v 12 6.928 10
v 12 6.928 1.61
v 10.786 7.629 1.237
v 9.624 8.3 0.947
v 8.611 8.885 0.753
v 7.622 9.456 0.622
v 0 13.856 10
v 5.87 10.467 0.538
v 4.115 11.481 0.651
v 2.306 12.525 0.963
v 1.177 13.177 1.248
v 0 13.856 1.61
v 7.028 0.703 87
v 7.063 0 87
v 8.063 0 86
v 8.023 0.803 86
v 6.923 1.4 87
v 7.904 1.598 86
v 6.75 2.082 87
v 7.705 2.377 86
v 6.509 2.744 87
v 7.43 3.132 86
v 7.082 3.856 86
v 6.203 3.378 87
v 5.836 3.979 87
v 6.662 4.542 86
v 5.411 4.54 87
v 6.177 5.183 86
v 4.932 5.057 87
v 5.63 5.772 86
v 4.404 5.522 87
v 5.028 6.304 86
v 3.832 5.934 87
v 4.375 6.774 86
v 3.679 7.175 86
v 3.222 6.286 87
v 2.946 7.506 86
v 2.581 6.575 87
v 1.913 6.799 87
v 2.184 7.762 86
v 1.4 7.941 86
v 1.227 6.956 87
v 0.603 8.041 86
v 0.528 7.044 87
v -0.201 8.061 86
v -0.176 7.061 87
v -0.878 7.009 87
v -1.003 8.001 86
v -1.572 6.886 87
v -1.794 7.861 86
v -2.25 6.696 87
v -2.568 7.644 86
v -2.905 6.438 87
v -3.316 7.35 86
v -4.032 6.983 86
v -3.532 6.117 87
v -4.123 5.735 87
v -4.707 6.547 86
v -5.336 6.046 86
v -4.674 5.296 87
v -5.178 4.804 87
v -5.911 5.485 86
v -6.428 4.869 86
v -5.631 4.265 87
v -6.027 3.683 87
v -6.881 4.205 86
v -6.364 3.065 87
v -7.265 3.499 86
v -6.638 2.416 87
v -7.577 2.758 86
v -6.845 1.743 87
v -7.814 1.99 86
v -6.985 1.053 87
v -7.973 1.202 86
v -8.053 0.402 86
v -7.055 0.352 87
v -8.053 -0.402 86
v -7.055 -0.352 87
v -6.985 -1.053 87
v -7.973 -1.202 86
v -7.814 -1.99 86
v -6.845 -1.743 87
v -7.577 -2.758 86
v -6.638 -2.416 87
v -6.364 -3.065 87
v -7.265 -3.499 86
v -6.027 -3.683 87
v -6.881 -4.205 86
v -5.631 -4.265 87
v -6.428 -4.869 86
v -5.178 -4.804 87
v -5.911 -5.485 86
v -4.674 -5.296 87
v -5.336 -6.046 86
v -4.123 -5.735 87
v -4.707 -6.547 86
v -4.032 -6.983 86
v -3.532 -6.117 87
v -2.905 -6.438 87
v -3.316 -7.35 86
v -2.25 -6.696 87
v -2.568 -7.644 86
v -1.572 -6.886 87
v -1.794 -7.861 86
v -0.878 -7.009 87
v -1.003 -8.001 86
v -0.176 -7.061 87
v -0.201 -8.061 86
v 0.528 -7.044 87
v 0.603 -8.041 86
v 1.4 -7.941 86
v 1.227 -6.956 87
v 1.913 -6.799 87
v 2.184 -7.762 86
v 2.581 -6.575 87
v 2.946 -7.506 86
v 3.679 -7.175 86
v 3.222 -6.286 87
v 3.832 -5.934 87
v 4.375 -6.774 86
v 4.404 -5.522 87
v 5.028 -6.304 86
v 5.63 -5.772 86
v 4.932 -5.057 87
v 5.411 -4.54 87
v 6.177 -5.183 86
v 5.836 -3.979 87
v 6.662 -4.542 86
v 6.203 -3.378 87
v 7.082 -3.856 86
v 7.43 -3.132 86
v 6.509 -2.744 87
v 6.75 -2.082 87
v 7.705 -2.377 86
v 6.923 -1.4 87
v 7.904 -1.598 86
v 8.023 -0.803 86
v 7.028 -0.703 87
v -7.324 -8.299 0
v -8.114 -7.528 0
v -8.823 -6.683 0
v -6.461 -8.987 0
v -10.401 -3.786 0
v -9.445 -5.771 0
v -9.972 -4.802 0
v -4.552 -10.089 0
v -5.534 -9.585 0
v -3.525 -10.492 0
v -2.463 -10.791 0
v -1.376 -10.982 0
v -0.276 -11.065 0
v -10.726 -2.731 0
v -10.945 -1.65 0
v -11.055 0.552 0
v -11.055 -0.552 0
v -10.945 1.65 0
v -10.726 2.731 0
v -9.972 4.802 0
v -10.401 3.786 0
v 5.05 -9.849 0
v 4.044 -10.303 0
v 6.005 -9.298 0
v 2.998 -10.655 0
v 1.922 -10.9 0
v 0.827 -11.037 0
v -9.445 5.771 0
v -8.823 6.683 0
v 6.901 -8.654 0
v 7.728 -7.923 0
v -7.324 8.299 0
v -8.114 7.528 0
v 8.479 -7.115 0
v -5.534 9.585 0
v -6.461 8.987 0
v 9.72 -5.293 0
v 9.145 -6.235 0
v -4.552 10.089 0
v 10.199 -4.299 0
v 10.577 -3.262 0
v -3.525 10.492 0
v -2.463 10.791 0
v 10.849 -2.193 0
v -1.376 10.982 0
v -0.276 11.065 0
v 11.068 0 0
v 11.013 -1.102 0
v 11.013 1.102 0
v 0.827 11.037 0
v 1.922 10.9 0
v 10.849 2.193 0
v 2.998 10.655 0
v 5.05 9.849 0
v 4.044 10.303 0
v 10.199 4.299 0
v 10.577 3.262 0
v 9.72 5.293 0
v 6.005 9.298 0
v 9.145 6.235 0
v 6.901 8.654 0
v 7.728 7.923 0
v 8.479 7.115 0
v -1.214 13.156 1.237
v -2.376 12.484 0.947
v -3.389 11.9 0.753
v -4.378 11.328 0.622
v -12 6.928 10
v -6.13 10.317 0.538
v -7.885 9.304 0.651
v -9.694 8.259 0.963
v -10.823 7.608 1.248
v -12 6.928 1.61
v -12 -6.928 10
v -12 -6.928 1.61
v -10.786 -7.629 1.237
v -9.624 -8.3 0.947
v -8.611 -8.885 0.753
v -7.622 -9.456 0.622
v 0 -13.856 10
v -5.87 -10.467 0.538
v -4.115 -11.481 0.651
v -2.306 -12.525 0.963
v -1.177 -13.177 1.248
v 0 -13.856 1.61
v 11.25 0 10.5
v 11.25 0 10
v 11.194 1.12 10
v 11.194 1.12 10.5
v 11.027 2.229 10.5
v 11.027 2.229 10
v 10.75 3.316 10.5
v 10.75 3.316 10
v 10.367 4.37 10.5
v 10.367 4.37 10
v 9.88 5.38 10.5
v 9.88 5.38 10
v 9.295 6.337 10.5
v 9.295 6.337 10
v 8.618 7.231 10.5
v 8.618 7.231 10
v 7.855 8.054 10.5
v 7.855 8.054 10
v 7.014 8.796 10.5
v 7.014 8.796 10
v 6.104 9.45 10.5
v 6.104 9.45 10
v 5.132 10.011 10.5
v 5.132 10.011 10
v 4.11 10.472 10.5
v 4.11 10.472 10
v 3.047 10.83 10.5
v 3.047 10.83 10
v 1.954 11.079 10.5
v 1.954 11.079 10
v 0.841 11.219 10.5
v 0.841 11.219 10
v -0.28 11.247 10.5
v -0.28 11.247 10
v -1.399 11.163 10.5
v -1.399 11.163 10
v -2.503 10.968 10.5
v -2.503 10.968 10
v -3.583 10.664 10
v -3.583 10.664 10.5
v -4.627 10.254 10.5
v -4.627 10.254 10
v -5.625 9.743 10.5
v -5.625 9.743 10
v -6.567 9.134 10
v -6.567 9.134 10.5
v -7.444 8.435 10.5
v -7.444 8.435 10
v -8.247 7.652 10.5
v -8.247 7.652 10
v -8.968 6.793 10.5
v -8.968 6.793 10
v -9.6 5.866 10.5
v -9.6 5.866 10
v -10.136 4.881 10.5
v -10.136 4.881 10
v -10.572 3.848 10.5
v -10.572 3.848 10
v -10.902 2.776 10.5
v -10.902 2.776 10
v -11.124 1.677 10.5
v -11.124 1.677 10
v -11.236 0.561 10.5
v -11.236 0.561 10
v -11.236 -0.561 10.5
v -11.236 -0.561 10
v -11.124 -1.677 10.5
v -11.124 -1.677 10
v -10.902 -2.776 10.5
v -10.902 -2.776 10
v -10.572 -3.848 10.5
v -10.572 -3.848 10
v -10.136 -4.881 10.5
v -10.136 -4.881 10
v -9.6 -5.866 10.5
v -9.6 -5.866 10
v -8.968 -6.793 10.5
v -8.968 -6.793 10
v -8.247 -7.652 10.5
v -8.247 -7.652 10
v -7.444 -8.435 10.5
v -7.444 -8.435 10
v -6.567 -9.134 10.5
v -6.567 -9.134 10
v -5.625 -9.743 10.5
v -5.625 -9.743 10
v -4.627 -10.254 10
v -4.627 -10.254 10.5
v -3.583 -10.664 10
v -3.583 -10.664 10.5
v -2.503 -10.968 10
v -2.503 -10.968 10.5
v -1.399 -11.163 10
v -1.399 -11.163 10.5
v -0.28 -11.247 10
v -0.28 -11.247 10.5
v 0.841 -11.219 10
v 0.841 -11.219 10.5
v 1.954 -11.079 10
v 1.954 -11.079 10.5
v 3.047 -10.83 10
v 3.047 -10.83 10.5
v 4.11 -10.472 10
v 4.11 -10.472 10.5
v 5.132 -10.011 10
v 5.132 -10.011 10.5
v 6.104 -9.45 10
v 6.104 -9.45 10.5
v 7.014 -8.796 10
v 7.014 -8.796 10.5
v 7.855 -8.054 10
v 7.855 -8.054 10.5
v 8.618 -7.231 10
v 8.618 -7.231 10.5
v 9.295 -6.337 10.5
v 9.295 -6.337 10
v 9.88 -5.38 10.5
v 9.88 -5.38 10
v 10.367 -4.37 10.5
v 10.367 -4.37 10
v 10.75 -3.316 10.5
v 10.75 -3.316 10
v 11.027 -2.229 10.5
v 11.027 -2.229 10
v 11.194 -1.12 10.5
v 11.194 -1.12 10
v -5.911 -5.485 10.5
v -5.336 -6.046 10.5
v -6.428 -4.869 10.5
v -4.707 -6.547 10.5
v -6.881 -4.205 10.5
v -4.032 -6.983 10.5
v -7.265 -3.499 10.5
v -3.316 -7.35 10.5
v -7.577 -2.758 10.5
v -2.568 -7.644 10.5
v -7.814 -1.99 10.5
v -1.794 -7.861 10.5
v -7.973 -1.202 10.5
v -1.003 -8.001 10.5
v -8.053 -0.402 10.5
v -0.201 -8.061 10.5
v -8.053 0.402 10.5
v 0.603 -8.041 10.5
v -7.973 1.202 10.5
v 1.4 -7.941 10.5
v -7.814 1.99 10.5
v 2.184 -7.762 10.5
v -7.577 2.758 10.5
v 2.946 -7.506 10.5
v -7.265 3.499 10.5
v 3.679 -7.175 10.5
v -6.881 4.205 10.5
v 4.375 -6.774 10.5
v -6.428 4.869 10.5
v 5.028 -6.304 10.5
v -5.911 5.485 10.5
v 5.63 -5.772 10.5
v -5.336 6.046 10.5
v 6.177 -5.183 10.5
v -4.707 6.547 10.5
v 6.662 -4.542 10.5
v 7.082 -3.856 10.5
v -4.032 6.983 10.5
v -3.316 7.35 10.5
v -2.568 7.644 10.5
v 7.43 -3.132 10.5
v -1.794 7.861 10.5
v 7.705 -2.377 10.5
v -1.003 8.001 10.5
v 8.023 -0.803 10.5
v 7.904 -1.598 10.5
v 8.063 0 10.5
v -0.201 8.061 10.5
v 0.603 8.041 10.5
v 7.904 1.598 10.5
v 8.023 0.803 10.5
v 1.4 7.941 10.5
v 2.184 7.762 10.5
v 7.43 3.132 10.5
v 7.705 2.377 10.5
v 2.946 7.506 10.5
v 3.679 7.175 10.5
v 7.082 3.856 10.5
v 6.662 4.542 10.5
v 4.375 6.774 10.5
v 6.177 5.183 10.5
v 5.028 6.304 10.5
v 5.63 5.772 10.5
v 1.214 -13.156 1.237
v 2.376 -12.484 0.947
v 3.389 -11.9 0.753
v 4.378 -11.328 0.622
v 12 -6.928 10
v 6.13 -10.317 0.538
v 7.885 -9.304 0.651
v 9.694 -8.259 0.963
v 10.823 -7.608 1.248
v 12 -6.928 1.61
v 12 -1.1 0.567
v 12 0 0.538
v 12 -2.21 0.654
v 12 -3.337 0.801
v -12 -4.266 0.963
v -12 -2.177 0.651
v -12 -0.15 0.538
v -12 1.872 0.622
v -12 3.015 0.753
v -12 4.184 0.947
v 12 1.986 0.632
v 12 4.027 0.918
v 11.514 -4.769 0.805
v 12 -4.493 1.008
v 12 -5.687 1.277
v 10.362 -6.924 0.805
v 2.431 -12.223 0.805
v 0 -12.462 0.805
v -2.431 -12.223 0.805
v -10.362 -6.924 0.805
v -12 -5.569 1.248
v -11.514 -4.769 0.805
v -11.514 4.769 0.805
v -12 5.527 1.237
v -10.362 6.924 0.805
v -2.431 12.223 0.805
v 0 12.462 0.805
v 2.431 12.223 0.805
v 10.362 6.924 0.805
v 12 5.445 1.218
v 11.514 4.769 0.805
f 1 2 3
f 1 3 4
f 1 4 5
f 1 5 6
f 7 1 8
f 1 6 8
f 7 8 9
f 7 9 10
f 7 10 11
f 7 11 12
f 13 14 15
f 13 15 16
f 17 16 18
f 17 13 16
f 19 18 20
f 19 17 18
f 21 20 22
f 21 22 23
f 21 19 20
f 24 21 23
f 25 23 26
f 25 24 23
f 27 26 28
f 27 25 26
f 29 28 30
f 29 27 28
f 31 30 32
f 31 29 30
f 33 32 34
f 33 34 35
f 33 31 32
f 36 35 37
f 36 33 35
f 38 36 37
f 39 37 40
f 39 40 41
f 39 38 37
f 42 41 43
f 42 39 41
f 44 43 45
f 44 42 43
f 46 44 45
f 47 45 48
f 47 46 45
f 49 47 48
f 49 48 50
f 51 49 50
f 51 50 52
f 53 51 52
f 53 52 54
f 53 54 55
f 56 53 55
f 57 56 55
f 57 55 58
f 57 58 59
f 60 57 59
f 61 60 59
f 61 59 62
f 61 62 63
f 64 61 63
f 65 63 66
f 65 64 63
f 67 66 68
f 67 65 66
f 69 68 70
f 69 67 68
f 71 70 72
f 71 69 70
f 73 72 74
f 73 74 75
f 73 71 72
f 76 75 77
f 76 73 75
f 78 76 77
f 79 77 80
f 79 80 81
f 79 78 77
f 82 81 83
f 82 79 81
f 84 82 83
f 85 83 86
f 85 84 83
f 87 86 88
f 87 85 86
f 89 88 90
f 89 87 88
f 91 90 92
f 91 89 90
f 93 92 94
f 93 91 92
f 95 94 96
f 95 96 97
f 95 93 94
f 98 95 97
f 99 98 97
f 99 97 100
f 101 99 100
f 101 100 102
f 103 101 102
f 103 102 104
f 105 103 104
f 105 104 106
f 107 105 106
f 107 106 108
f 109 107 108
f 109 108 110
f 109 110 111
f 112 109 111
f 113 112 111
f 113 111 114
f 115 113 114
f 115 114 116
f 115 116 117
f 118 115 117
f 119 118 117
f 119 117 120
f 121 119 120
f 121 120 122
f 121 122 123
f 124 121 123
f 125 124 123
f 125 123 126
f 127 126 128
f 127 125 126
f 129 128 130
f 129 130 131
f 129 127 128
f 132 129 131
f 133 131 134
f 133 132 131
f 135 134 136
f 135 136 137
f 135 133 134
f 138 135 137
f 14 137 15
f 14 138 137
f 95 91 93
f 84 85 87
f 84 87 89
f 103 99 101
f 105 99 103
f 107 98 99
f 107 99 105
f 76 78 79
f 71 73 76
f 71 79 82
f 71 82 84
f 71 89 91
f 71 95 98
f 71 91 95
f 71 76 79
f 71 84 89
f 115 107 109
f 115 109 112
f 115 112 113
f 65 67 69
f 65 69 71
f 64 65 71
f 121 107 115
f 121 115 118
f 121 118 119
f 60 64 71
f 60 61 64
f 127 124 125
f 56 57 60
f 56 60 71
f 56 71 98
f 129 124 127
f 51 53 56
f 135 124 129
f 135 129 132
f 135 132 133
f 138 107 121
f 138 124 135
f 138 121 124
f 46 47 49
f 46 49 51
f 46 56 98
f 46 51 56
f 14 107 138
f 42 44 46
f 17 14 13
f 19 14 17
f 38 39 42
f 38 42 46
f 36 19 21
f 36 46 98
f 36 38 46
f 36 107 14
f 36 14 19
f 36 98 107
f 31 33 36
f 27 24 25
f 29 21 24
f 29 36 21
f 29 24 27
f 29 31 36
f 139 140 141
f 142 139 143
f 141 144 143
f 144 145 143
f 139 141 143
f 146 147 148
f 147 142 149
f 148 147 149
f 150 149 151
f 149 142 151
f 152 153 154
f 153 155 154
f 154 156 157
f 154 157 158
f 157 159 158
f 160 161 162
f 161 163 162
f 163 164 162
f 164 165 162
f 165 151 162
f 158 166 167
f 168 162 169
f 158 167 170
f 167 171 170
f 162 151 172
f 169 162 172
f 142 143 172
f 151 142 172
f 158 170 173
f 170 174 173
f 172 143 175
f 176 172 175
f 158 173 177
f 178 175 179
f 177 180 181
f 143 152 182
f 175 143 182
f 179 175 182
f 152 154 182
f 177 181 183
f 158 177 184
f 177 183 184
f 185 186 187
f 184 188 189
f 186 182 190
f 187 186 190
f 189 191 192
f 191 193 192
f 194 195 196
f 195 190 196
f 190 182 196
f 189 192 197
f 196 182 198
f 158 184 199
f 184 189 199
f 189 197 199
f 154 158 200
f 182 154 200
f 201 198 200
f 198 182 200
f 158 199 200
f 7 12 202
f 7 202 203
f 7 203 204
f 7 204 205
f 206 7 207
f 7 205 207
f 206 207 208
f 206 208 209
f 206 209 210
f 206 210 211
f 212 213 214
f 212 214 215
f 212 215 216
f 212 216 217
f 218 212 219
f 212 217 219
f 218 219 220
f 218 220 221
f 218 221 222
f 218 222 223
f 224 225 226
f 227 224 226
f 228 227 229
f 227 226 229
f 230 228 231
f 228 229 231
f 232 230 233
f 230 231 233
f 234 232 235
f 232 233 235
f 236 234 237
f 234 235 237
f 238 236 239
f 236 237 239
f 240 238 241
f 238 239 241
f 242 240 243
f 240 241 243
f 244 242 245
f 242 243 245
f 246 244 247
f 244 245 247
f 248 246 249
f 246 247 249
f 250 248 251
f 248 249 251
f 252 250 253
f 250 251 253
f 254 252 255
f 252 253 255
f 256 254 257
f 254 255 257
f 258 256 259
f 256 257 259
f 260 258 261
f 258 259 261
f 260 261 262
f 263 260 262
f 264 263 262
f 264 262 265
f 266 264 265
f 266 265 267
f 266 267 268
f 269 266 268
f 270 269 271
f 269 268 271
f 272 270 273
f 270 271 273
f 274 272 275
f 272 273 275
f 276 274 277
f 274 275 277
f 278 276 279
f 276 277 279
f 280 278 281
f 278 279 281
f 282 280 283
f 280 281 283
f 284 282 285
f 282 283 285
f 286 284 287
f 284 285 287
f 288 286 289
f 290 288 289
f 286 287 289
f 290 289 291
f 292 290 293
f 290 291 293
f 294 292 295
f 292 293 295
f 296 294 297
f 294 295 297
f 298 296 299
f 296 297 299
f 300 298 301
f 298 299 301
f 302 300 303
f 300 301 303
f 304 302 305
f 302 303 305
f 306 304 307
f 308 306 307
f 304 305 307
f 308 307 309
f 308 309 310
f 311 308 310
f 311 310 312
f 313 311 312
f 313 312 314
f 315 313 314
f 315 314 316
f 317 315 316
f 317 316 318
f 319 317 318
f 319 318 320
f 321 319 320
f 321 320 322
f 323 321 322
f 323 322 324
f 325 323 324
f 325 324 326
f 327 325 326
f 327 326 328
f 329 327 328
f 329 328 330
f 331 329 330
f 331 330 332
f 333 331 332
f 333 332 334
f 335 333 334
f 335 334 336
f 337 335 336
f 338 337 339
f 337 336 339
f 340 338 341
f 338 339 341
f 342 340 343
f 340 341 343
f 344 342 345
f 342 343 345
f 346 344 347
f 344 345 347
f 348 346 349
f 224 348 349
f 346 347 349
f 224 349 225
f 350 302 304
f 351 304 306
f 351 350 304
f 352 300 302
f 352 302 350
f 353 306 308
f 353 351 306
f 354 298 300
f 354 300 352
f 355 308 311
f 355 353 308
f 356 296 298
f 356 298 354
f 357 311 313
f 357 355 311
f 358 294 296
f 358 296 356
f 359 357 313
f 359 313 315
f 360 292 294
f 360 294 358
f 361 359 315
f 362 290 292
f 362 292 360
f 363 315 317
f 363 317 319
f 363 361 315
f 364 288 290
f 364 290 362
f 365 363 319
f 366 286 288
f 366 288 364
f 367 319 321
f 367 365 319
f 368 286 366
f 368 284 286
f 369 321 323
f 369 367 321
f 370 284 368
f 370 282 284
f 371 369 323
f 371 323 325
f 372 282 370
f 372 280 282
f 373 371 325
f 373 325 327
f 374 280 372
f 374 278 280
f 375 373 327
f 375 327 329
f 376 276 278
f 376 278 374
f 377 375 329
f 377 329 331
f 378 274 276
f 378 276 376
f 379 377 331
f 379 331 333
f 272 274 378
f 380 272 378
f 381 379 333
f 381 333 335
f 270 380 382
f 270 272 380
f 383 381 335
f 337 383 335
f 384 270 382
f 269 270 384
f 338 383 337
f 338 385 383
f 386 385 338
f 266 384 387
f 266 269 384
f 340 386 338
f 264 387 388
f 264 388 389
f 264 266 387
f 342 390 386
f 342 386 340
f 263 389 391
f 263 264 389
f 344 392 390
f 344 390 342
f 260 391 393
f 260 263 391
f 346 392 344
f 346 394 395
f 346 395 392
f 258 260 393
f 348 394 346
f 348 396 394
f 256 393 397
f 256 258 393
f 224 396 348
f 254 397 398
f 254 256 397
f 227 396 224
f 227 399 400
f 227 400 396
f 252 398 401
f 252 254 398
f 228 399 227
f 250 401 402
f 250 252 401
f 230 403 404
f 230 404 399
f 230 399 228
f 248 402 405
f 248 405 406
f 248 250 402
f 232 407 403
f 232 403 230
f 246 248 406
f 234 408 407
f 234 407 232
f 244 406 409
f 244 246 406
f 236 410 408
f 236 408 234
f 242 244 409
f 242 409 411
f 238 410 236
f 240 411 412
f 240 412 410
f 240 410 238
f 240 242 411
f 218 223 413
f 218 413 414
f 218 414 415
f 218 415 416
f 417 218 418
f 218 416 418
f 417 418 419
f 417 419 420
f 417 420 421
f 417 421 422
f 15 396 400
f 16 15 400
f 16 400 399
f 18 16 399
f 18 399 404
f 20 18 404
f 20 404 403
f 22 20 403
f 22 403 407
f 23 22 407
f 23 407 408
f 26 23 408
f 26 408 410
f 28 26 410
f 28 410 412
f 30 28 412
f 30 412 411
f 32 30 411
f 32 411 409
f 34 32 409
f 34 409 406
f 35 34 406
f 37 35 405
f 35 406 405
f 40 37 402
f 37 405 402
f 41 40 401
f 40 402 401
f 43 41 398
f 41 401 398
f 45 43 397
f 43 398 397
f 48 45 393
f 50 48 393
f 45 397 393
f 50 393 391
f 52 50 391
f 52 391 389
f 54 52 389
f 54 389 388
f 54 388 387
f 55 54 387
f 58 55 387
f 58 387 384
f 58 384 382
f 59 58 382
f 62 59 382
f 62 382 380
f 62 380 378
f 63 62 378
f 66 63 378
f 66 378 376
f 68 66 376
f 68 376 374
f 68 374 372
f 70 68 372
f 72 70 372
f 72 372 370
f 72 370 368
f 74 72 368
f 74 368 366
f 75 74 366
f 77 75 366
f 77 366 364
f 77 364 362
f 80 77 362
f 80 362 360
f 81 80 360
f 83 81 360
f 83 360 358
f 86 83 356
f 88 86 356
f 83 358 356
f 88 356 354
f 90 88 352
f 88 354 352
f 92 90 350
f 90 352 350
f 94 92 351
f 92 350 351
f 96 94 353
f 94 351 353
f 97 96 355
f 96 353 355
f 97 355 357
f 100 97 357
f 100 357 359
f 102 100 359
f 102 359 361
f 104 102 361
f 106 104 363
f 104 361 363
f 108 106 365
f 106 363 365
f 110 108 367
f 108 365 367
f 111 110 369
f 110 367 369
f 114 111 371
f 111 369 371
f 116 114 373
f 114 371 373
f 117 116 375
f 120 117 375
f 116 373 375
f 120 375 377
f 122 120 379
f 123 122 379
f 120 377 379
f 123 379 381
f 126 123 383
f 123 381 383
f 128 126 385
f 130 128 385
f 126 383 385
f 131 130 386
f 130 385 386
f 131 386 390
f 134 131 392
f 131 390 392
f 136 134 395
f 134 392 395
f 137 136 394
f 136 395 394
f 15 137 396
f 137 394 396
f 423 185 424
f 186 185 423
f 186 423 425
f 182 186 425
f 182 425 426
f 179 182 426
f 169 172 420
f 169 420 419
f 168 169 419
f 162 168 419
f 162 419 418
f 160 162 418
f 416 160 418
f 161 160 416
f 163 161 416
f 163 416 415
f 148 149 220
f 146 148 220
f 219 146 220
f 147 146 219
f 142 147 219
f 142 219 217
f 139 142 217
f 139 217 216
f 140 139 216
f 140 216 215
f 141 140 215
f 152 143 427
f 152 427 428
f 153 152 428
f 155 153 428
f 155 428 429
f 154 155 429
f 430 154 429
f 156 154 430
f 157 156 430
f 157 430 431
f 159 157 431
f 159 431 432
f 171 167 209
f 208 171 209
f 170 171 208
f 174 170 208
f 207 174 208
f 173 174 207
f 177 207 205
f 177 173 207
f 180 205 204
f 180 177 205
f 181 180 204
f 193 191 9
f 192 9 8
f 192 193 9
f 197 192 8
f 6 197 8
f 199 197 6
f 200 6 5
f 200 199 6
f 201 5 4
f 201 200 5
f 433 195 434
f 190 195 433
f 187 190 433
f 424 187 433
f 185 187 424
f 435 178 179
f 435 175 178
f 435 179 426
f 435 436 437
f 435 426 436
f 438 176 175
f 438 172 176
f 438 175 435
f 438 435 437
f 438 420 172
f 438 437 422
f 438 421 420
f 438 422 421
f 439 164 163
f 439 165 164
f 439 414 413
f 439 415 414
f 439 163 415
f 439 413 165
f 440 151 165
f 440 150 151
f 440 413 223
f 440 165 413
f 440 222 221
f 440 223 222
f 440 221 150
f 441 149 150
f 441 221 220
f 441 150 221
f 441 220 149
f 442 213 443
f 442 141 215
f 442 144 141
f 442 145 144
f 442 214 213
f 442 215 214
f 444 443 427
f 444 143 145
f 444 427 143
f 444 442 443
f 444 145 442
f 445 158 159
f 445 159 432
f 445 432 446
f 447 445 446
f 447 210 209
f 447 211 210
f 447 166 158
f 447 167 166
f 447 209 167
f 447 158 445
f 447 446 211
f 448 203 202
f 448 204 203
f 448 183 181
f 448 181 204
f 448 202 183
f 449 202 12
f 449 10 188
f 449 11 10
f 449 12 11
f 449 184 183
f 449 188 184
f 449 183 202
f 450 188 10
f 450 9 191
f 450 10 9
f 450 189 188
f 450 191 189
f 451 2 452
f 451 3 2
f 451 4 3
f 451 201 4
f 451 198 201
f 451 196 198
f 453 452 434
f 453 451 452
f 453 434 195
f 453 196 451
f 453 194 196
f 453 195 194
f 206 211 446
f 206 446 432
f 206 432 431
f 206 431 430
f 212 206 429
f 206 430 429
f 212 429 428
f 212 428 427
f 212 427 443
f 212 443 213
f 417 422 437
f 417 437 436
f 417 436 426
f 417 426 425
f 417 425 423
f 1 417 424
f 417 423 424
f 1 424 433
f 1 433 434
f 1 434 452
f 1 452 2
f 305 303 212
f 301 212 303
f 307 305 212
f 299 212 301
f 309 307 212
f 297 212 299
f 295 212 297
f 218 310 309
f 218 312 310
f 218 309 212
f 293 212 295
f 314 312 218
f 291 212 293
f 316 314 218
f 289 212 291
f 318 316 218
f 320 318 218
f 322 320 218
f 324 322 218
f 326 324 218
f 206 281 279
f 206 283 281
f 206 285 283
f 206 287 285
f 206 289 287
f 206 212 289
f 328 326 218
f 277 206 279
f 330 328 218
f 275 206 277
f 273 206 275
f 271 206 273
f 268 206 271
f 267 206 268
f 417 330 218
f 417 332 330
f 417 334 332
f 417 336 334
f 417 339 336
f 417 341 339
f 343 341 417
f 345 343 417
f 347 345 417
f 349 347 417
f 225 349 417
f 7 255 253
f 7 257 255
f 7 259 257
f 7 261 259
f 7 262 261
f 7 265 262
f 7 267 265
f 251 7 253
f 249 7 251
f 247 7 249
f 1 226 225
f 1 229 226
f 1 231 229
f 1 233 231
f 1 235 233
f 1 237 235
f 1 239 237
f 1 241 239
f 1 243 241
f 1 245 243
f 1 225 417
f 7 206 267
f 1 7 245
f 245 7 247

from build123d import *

# Parameters (mm, degrees)
SALIENTE_EXTRUIR1_DEPTH = 10
CROQUIS2_R              = 8.0635
SALIENTE_EXTRUIR2_DEPTH = 77
CROQUIS8_R              = 11.25
SALIENTE_EXTRUIR3_DEPTH = 0.5
CHAFL_N1_SIZE           = 1


with BuildPart() as part:
    # Croquis1 → Saliente-Extruir1 (new body)
    with BuildSketch(Plane.XY):
        Polygon((0, 13.856406461), (-12, 6.92820323), (-12, -6.92820323), (0, -13.856406461), (12, -6.92820323), (12, 6.92820323), align=None)
    extrude(amount=SALIENTE_EXTRUIR1_DEPTH)

    # Croquis2 → Saliente-Extruir2 (add)
    with BuildSketch(Plane.XY.offset(10)):
        Circle(CROQUIS2_R)
    extrude(amount=SALIENTE_EXTRUIR2_DEPTH)

    # Croquis7 → Cortar-Revolución1 (revolve, cut)
    with BuildSketch(Plane(origin=(0, 0, 0), x_dir=(0, 0, -1), z_dir=(1, 0, 0)), mode=Mode.PRIVATE) as cortar_revoluci_n1_sk:
        Polygon((-3.49549265, 17.122750007), (0.466312036, 10.260703002), (0.466312036, 17.122750007), align=None)
    revolve(cortar_revoluci_n1_sk.sketch.rotate(Axis((0, 0, 3.49549265), (0, 0, -1)), 90), axis=Axis((0, 0, 3.49549265), (0, 0, -1)), mode=Mode.SUBTRACT)

    # Croquis8 → Saliente-Extruir3 (add)
    with BuildSketch(Plane.XY.offset(10)):
        Circle(CROQUIS8_R)
    extrude(amount=SALIENTE_EXTRUIR3_DEPTH)

    # Chaflán1
    chafl_n1_edges = [part.edges().sort_by_distance(p)[0] for p in [
        (-8.0635, 0, 87),
    ]]
    chamfer(chafl_n1_edges, length=CHAFL_N1_SIZE)


solid = part.part
